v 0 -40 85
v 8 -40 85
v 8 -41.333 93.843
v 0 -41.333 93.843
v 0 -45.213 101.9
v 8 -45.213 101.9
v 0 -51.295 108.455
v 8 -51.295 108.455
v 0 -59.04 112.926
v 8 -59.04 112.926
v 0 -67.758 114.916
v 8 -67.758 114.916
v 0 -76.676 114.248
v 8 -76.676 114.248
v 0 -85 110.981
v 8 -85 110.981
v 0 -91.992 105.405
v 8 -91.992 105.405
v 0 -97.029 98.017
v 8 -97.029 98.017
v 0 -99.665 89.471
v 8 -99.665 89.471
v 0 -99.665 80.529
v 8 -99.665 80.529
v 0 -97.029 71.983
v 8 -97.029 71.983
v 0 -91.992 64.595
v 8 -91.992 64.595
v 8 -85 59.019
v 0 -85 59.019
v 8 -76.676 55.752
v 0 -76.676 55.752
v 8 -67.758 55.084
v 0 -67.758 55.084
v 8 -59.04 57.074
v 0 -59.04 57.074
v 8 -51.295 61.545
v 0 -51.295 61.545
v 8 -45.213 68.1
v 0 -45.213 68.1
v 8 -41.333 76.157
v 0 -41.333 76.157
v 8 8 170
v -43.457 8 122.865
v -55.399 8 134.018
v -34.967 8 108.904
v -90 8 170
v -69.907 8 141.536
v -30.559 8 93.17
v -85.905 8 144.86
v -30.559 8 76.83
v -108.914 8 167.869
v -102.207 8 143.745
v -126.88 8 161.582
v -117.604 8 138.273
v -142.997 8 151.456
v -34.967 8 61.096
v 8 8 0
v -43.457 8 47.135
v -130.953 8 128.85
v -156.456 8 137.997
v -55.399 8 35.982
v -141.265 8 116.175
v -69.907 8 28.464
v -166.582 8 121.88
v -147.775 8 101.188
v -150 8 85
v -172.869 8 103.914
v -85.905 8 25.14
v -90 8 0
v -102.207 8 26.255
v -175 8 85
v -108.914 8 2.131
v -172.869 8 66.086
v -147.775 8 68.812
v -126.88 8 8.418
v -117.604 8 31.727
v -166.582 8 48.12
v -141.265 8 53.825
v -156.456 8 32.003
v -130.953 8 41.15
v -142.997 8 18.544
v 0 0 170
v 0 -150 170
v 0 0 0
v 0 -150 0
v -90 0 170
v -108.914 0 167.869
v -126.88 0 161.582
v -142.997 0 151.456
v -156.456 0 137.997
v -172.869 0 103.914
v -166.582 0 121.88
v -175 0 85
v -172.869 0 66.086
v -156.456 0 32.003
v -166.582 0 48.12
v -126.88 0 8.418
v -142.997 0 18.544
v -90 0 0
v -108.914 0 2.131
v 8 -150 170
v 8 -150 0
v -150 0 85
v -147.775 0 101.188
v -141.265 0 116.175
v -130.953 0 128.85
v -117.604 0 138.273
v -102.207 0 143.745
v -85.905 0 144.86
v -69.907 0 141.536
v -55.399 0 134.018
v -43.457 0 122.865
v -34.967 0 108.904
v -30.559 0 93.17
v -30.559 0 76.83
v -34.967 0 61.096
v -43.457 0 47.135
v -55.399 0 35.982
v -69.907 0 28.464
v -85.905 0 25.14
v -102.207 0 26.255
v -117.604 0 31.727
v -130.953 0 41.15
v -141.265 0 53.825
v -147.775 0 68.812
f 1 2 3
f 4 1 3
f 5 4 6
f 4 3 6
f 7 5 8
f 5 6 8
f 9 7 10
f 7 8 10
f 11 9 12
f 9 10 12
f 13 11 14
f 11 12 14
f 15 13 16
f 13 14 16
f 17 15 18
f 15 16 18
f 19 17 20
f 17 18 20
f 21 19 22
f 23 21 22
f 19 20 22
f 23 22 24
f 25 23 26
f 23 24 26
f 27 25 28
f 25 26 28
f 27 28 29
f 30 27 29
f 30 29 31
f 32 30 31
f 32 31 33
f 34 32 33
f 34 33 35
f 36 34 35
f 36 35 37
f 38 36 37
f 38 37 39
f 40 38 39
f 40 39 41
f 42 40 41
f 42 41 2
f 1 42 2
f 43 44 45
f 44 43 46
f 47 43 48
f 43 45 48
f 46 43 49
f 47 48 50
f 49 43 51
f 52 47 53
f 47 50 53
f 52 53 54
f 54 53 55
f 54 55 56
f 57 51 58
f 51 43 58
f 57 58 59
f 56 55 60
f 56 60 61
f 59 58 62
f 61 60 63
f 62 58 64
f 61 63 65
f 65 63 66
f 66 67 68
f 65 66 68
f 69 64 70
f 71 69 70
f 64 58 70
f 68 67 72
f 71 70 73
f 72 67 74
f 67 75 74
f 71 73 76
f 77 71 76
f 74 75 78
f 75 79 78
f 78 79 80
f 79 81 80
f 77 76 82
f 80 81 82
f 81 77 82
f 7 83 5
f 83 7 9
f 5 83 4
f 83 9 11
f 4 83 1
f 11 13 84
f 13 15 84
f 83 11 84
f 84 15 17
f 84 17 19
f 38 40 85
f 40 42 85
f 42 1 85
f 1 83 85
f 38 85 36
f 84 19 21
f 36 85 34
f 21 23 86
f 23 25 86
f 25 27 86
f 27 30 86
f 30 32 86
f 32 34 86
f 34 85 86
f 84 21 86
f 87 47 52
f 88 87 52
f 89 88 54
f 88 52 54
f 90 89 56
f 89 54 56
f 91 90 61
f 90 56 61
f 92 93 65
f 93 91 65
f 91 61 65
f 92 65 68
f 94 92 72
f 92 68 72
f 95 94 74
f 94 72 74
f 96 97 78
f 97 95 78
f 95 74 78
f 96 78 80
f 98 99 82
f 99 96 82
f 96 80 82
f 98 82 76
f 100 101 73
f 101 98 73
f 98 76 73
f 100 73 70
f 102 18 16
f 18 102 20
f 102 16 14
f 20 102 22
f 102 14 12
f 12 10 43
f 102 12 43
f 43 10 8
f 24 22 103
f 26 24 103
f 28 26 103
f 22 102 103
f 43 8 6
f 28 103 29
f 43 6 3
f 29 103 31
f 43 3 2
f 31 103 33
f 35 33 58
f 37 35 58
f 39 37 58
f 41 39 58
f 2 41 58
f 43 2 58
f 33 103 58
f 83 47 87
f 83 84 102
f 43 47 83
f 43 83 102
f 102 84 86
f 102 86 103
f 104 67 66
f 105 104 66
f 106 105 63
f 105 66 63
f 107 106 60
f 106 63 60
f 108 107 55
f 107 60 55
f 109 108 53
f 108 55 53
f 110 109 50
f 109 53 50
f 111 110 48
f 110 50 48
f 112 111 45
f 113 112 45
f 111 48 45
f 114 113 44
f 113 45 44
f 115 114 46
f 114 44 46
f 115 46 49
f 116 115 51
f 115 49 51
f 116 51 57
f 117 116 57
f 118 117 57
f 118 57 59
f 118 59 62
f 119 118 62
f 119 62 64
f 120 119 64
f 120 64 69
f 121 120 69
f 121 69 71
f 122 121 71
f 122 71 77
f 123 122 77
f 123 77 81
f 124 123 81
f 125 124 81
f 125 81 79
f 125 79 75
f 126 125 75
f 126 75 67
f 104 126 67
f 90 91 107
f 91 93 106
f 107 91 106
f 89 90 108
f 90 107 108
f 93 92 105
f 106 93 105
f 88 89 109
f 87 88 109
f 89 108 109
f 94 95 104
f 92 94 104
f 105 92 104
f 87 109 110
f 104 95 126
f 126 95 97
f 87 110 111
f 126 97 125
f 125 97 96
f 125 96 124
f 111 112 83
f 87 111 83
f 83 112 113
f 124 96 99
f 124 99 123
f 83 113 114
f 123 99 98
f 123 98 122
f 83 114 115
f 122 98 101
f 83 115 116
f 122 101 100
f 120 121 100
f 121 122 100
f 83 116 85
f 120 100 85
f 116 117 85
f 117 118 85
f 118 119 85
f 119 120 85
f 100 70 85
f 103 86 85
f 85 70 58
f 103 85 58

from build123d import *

# Parameters (mm, degrees)
EXTRUDE_1_DEPTH     = 170
SKETCH_2_R          = 60
CUT_EXTRUDE_1_DEPTH = 180
SKETCH_3_R          = 30
CUT_EXTRUDE_2_DEPTH = 180


with BuildPart() as part:
    # 草图1 → 凸台-拉伸1 (new body)
    with BuildSketch(Plane.XY):
        Polygon((-180, 0), (0, 0), (0, -150), (8, -150), (8, 8), (-180, 8), align=None)
    extrude(amount=EXTRUDE_1_DEPTH)

    # 草图2 → 切除-拉伸1 (cut)
    with BuildSketch(Plane(origin=(0, 8, 0), x_dir=(1, 0, 0), z_dir=(0, 1, 0))):
        with Locations(Location((-90, -85, 0), (0, 0, 180))):
            Circle(SKETCH_2_R)
        with BuildLine():
            ThreePointArc((-90, -170), (-175, -85), (-90, 0))
            Line((-90, 0), (-180, 0))
            Line((-180, 0), (-180, -170))
            Line((-180, -170), (-90, -170))
        make_face()
    extrude(amount=-CUT_EXTRUDE_1_DEPTH, mode=Mode.SUBTRACT)

    # 草图3 → 切除-拉伸2 (cut)
    with BuildSketch(Plane(origin=(8, 0, 0), x_dir=(0, 0, -1), z_dir=(1, 0, 0))):
        with Locations(Location((-85, -70, 0), (0, 0, 90))):
            Circle(SKETCH_3_R)
    extrude(amount=-CUT_EXTRUDE_2_DEPTH, mode=Mode.SUBTRACT)


solid = part.part
